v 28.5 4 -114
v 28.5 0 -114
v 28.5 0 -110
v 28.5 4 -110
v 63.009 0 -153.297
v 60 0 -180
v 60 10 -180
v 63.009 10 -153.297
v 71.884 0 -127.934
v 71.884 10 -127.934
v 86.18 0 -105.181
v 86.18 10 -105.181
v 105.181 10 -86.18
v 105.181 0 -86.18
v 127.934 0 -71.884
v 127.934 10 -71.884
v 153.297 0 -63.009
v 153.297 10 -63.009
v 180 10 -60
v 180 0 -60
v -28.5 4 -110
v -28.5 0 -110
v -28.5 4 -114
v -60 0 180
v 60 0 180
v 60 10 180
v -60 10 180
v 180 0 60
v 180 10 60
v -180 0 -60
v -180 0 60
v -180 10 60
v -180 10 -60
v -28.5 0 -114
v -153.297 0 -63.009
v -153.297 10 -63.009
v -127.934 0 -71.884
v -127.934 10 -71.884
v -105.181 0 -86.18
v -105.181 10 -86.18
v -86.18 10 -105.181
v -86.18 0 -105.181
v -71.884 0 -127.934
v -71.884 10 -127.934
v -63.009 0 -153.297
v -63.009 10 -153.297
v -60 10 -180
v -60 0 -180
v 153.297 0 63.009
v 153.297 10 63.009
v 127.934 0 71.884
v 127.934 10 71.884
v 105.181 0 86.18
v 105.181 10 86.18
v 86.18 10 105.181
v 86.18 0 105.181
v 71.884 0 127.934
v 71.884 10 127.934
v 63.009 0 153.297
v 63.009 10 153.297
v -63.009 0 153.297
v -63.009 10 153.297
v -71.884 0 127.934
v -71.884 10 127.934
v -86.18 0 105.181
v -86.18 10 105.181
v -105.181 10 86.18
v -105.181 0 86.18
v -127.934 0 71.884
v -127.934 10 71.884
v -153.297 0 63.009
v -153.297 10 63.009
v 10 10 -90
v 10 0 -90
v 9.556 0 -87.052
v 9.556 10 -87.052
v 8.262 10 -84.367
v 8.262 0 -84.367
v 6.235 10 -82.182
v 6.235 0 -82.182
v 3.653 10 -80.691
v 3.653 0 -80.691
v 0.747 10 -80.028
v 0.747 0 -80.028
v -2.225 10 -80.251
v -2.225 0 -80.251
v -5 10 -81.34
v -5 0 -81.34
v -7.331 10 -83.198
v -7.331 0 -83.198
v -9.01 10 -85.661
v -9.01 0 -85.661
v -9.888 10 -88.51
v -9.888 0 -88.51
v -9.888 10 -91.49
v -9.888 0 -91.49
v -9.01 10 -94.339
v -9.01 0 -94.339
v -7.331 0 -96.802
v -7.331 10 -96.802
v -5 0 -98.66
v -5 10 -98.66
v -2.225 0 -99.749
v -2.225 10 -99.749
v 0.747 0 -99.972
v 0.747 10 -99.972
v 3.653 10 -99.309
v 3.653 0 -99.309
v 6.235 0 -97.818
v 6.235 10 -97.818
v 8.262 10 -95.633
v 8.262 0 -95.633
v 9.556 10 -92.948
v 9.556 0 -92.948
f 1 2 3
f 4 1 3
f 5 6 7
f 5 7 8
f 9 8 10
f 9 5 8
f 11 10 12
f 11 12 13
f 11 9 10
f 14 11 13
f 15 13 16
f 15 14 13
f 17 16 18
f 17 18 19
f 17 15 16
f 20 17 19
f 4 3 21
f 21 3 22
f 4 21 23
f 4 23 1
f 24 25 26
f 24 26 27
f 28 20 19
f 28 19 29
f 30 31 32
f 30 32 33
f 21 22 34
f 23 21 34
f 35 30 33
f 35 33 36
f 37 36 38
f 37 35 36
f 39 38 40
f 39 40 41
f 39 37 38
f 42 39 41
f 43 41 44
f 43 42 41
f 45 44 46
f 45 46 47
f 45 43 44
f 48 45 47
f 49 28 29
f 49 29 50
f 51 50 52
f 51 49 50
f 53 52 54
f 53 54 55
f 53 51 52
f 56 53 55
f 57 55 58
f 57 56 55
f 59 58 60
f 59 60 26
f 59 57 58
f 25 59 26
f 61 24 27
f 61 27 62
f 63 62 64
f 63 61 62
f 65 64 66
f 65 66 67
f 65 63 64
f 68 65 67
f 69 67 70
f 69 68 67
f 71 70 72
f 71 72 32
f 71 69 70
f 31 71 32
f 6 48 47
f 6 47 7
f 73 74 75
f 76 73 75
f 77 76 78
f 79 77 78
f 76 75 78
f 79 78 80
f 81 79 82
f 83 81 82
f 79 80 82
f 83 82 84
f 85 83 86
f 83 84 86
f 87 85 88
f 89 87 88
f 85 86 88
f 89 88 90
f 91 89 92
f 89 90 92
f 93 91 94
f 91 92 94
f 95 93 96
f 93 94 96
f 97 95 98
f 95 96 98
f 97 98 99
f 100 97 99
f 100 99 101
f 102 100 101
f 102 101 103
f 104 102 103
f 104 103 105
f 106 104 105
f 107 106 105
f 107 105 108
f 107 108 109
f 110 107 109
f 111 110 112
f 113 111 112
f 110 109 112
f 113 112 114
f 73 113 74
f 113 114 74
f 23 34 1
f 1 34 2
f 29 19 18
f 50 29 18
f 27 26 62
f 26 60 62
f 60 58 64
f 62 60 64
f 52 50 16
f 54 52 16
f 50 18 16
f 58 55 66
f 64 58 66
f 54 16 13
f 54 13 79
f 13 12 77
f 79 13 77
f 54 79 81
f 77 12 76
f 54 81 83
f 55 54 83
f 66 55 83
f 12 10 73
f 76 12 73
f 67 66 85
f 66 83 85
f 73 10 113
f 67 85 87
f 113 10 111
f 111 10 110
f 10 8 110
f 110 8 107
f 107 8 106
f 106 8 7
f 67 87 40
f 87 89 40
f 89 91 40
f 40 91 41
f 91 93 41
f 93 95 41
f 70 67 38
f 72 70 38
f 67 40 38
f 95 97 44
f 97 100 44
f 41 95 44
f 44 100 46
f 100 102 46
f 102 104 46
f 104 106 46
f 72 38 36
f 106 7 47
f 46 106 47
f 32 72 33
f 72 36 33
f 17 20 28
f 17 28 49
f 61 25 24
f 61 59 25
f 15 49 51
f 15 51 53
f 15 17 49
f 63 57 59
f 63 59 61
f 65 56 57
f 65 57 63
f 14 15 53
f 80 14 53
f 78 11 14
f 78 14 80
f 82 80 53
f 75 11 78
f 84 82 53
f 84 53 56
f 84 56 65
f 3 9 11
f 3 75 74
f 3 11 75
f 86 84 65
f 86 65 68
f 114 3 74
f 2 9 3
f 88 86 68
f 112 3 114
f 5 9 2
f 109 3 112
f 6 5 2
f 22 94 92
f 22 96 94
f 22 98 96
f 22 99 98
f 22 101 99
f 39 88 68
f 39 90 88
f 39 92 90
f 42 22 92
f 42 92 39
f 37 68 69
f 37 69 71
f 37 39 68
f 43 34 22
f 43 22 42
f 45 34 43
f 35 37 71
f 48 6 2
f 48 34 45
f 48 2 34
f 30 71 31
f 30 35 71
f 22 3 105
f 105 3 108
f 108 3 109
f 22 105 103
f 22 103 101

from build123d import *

# Parameters (mm, degrees)
BOSS_EXTRUDE1_DEPTH = 10
SKETCH2_R           = 10
CUT_EXTRUDE1_DEPTH  = 10
CUT_EXTRUDE3_DEPTH  = 4


with BuildPart() as part:
    # Sketch1 → Boss-Extrude1 (new body)
    with BuildSketch(Plane(origin=(0, 0, 0), x_dir=(1, 0, 0), z_dir=(0, 1, 0))):
        Polygon((60, -60), (60, -180), (-60, -180), (-60, -60), (-180, -60), (-180, 60), (-60, 60), (-60, 180), (60, 180), (60, 60), (180, 60), (180, -60), align=None)
        with BuildLine():
            Line((-60, 180), (-60, 60))
            Line((-60, 60), (-180, 60))
            ThreePointArc((-180, 60), (-95.147186258, 95.147186258), (-60, 180))
        make_face()
        with BuildLine():
            ThreePointArc((60, 180), (95.147186258, 95.147186258), (180, 60))
            Line((180, 60), (60, 60))
            Line((60, 60), (60, 180))
        make_face()
        with BuildLine():
            ThreePointArc((180, -60), (95.147186258, -95.147186258), (60, -180))
            Line((60, -180), (60, -60))
            Line((60, -60), (180, -60))
        make_face()
        with BuildLine():
            Line((-180, -60), (-60, -60))
            Line((-60, -60), (-60, -180))
            ThreePointArc((-60, -180), (-95.147186258, -95.147186258), (-180, -60))
        make_face()
    extrude(amount=BOSS_EXTRUDE1_DEPTH)

    # Sketch2 → Cut-Extrude1 (cut)
    with BuildSketch(Plane.XZ):
        with Locations((0, -90)):
            Circle(SKETCH2_R)
    extrude(amount=-CUT_EXTRUDE1_DEPTH, mode=Mode.SUBTRACT)

    # Sketch5 → Cut-Extrude3 (cut)
    with BuildSketch(Plane.XZ):
        Polygon((24.5, -110), (-24.5, -110), (-28.5, -110), (-28.5, -114), (28.5, -114), (28.5, -110), align=None)
    extrude(amount=-CUT_EXTRUDE3_DEPTH, mode=Mode.SUBTRACT)


solid = part.part
